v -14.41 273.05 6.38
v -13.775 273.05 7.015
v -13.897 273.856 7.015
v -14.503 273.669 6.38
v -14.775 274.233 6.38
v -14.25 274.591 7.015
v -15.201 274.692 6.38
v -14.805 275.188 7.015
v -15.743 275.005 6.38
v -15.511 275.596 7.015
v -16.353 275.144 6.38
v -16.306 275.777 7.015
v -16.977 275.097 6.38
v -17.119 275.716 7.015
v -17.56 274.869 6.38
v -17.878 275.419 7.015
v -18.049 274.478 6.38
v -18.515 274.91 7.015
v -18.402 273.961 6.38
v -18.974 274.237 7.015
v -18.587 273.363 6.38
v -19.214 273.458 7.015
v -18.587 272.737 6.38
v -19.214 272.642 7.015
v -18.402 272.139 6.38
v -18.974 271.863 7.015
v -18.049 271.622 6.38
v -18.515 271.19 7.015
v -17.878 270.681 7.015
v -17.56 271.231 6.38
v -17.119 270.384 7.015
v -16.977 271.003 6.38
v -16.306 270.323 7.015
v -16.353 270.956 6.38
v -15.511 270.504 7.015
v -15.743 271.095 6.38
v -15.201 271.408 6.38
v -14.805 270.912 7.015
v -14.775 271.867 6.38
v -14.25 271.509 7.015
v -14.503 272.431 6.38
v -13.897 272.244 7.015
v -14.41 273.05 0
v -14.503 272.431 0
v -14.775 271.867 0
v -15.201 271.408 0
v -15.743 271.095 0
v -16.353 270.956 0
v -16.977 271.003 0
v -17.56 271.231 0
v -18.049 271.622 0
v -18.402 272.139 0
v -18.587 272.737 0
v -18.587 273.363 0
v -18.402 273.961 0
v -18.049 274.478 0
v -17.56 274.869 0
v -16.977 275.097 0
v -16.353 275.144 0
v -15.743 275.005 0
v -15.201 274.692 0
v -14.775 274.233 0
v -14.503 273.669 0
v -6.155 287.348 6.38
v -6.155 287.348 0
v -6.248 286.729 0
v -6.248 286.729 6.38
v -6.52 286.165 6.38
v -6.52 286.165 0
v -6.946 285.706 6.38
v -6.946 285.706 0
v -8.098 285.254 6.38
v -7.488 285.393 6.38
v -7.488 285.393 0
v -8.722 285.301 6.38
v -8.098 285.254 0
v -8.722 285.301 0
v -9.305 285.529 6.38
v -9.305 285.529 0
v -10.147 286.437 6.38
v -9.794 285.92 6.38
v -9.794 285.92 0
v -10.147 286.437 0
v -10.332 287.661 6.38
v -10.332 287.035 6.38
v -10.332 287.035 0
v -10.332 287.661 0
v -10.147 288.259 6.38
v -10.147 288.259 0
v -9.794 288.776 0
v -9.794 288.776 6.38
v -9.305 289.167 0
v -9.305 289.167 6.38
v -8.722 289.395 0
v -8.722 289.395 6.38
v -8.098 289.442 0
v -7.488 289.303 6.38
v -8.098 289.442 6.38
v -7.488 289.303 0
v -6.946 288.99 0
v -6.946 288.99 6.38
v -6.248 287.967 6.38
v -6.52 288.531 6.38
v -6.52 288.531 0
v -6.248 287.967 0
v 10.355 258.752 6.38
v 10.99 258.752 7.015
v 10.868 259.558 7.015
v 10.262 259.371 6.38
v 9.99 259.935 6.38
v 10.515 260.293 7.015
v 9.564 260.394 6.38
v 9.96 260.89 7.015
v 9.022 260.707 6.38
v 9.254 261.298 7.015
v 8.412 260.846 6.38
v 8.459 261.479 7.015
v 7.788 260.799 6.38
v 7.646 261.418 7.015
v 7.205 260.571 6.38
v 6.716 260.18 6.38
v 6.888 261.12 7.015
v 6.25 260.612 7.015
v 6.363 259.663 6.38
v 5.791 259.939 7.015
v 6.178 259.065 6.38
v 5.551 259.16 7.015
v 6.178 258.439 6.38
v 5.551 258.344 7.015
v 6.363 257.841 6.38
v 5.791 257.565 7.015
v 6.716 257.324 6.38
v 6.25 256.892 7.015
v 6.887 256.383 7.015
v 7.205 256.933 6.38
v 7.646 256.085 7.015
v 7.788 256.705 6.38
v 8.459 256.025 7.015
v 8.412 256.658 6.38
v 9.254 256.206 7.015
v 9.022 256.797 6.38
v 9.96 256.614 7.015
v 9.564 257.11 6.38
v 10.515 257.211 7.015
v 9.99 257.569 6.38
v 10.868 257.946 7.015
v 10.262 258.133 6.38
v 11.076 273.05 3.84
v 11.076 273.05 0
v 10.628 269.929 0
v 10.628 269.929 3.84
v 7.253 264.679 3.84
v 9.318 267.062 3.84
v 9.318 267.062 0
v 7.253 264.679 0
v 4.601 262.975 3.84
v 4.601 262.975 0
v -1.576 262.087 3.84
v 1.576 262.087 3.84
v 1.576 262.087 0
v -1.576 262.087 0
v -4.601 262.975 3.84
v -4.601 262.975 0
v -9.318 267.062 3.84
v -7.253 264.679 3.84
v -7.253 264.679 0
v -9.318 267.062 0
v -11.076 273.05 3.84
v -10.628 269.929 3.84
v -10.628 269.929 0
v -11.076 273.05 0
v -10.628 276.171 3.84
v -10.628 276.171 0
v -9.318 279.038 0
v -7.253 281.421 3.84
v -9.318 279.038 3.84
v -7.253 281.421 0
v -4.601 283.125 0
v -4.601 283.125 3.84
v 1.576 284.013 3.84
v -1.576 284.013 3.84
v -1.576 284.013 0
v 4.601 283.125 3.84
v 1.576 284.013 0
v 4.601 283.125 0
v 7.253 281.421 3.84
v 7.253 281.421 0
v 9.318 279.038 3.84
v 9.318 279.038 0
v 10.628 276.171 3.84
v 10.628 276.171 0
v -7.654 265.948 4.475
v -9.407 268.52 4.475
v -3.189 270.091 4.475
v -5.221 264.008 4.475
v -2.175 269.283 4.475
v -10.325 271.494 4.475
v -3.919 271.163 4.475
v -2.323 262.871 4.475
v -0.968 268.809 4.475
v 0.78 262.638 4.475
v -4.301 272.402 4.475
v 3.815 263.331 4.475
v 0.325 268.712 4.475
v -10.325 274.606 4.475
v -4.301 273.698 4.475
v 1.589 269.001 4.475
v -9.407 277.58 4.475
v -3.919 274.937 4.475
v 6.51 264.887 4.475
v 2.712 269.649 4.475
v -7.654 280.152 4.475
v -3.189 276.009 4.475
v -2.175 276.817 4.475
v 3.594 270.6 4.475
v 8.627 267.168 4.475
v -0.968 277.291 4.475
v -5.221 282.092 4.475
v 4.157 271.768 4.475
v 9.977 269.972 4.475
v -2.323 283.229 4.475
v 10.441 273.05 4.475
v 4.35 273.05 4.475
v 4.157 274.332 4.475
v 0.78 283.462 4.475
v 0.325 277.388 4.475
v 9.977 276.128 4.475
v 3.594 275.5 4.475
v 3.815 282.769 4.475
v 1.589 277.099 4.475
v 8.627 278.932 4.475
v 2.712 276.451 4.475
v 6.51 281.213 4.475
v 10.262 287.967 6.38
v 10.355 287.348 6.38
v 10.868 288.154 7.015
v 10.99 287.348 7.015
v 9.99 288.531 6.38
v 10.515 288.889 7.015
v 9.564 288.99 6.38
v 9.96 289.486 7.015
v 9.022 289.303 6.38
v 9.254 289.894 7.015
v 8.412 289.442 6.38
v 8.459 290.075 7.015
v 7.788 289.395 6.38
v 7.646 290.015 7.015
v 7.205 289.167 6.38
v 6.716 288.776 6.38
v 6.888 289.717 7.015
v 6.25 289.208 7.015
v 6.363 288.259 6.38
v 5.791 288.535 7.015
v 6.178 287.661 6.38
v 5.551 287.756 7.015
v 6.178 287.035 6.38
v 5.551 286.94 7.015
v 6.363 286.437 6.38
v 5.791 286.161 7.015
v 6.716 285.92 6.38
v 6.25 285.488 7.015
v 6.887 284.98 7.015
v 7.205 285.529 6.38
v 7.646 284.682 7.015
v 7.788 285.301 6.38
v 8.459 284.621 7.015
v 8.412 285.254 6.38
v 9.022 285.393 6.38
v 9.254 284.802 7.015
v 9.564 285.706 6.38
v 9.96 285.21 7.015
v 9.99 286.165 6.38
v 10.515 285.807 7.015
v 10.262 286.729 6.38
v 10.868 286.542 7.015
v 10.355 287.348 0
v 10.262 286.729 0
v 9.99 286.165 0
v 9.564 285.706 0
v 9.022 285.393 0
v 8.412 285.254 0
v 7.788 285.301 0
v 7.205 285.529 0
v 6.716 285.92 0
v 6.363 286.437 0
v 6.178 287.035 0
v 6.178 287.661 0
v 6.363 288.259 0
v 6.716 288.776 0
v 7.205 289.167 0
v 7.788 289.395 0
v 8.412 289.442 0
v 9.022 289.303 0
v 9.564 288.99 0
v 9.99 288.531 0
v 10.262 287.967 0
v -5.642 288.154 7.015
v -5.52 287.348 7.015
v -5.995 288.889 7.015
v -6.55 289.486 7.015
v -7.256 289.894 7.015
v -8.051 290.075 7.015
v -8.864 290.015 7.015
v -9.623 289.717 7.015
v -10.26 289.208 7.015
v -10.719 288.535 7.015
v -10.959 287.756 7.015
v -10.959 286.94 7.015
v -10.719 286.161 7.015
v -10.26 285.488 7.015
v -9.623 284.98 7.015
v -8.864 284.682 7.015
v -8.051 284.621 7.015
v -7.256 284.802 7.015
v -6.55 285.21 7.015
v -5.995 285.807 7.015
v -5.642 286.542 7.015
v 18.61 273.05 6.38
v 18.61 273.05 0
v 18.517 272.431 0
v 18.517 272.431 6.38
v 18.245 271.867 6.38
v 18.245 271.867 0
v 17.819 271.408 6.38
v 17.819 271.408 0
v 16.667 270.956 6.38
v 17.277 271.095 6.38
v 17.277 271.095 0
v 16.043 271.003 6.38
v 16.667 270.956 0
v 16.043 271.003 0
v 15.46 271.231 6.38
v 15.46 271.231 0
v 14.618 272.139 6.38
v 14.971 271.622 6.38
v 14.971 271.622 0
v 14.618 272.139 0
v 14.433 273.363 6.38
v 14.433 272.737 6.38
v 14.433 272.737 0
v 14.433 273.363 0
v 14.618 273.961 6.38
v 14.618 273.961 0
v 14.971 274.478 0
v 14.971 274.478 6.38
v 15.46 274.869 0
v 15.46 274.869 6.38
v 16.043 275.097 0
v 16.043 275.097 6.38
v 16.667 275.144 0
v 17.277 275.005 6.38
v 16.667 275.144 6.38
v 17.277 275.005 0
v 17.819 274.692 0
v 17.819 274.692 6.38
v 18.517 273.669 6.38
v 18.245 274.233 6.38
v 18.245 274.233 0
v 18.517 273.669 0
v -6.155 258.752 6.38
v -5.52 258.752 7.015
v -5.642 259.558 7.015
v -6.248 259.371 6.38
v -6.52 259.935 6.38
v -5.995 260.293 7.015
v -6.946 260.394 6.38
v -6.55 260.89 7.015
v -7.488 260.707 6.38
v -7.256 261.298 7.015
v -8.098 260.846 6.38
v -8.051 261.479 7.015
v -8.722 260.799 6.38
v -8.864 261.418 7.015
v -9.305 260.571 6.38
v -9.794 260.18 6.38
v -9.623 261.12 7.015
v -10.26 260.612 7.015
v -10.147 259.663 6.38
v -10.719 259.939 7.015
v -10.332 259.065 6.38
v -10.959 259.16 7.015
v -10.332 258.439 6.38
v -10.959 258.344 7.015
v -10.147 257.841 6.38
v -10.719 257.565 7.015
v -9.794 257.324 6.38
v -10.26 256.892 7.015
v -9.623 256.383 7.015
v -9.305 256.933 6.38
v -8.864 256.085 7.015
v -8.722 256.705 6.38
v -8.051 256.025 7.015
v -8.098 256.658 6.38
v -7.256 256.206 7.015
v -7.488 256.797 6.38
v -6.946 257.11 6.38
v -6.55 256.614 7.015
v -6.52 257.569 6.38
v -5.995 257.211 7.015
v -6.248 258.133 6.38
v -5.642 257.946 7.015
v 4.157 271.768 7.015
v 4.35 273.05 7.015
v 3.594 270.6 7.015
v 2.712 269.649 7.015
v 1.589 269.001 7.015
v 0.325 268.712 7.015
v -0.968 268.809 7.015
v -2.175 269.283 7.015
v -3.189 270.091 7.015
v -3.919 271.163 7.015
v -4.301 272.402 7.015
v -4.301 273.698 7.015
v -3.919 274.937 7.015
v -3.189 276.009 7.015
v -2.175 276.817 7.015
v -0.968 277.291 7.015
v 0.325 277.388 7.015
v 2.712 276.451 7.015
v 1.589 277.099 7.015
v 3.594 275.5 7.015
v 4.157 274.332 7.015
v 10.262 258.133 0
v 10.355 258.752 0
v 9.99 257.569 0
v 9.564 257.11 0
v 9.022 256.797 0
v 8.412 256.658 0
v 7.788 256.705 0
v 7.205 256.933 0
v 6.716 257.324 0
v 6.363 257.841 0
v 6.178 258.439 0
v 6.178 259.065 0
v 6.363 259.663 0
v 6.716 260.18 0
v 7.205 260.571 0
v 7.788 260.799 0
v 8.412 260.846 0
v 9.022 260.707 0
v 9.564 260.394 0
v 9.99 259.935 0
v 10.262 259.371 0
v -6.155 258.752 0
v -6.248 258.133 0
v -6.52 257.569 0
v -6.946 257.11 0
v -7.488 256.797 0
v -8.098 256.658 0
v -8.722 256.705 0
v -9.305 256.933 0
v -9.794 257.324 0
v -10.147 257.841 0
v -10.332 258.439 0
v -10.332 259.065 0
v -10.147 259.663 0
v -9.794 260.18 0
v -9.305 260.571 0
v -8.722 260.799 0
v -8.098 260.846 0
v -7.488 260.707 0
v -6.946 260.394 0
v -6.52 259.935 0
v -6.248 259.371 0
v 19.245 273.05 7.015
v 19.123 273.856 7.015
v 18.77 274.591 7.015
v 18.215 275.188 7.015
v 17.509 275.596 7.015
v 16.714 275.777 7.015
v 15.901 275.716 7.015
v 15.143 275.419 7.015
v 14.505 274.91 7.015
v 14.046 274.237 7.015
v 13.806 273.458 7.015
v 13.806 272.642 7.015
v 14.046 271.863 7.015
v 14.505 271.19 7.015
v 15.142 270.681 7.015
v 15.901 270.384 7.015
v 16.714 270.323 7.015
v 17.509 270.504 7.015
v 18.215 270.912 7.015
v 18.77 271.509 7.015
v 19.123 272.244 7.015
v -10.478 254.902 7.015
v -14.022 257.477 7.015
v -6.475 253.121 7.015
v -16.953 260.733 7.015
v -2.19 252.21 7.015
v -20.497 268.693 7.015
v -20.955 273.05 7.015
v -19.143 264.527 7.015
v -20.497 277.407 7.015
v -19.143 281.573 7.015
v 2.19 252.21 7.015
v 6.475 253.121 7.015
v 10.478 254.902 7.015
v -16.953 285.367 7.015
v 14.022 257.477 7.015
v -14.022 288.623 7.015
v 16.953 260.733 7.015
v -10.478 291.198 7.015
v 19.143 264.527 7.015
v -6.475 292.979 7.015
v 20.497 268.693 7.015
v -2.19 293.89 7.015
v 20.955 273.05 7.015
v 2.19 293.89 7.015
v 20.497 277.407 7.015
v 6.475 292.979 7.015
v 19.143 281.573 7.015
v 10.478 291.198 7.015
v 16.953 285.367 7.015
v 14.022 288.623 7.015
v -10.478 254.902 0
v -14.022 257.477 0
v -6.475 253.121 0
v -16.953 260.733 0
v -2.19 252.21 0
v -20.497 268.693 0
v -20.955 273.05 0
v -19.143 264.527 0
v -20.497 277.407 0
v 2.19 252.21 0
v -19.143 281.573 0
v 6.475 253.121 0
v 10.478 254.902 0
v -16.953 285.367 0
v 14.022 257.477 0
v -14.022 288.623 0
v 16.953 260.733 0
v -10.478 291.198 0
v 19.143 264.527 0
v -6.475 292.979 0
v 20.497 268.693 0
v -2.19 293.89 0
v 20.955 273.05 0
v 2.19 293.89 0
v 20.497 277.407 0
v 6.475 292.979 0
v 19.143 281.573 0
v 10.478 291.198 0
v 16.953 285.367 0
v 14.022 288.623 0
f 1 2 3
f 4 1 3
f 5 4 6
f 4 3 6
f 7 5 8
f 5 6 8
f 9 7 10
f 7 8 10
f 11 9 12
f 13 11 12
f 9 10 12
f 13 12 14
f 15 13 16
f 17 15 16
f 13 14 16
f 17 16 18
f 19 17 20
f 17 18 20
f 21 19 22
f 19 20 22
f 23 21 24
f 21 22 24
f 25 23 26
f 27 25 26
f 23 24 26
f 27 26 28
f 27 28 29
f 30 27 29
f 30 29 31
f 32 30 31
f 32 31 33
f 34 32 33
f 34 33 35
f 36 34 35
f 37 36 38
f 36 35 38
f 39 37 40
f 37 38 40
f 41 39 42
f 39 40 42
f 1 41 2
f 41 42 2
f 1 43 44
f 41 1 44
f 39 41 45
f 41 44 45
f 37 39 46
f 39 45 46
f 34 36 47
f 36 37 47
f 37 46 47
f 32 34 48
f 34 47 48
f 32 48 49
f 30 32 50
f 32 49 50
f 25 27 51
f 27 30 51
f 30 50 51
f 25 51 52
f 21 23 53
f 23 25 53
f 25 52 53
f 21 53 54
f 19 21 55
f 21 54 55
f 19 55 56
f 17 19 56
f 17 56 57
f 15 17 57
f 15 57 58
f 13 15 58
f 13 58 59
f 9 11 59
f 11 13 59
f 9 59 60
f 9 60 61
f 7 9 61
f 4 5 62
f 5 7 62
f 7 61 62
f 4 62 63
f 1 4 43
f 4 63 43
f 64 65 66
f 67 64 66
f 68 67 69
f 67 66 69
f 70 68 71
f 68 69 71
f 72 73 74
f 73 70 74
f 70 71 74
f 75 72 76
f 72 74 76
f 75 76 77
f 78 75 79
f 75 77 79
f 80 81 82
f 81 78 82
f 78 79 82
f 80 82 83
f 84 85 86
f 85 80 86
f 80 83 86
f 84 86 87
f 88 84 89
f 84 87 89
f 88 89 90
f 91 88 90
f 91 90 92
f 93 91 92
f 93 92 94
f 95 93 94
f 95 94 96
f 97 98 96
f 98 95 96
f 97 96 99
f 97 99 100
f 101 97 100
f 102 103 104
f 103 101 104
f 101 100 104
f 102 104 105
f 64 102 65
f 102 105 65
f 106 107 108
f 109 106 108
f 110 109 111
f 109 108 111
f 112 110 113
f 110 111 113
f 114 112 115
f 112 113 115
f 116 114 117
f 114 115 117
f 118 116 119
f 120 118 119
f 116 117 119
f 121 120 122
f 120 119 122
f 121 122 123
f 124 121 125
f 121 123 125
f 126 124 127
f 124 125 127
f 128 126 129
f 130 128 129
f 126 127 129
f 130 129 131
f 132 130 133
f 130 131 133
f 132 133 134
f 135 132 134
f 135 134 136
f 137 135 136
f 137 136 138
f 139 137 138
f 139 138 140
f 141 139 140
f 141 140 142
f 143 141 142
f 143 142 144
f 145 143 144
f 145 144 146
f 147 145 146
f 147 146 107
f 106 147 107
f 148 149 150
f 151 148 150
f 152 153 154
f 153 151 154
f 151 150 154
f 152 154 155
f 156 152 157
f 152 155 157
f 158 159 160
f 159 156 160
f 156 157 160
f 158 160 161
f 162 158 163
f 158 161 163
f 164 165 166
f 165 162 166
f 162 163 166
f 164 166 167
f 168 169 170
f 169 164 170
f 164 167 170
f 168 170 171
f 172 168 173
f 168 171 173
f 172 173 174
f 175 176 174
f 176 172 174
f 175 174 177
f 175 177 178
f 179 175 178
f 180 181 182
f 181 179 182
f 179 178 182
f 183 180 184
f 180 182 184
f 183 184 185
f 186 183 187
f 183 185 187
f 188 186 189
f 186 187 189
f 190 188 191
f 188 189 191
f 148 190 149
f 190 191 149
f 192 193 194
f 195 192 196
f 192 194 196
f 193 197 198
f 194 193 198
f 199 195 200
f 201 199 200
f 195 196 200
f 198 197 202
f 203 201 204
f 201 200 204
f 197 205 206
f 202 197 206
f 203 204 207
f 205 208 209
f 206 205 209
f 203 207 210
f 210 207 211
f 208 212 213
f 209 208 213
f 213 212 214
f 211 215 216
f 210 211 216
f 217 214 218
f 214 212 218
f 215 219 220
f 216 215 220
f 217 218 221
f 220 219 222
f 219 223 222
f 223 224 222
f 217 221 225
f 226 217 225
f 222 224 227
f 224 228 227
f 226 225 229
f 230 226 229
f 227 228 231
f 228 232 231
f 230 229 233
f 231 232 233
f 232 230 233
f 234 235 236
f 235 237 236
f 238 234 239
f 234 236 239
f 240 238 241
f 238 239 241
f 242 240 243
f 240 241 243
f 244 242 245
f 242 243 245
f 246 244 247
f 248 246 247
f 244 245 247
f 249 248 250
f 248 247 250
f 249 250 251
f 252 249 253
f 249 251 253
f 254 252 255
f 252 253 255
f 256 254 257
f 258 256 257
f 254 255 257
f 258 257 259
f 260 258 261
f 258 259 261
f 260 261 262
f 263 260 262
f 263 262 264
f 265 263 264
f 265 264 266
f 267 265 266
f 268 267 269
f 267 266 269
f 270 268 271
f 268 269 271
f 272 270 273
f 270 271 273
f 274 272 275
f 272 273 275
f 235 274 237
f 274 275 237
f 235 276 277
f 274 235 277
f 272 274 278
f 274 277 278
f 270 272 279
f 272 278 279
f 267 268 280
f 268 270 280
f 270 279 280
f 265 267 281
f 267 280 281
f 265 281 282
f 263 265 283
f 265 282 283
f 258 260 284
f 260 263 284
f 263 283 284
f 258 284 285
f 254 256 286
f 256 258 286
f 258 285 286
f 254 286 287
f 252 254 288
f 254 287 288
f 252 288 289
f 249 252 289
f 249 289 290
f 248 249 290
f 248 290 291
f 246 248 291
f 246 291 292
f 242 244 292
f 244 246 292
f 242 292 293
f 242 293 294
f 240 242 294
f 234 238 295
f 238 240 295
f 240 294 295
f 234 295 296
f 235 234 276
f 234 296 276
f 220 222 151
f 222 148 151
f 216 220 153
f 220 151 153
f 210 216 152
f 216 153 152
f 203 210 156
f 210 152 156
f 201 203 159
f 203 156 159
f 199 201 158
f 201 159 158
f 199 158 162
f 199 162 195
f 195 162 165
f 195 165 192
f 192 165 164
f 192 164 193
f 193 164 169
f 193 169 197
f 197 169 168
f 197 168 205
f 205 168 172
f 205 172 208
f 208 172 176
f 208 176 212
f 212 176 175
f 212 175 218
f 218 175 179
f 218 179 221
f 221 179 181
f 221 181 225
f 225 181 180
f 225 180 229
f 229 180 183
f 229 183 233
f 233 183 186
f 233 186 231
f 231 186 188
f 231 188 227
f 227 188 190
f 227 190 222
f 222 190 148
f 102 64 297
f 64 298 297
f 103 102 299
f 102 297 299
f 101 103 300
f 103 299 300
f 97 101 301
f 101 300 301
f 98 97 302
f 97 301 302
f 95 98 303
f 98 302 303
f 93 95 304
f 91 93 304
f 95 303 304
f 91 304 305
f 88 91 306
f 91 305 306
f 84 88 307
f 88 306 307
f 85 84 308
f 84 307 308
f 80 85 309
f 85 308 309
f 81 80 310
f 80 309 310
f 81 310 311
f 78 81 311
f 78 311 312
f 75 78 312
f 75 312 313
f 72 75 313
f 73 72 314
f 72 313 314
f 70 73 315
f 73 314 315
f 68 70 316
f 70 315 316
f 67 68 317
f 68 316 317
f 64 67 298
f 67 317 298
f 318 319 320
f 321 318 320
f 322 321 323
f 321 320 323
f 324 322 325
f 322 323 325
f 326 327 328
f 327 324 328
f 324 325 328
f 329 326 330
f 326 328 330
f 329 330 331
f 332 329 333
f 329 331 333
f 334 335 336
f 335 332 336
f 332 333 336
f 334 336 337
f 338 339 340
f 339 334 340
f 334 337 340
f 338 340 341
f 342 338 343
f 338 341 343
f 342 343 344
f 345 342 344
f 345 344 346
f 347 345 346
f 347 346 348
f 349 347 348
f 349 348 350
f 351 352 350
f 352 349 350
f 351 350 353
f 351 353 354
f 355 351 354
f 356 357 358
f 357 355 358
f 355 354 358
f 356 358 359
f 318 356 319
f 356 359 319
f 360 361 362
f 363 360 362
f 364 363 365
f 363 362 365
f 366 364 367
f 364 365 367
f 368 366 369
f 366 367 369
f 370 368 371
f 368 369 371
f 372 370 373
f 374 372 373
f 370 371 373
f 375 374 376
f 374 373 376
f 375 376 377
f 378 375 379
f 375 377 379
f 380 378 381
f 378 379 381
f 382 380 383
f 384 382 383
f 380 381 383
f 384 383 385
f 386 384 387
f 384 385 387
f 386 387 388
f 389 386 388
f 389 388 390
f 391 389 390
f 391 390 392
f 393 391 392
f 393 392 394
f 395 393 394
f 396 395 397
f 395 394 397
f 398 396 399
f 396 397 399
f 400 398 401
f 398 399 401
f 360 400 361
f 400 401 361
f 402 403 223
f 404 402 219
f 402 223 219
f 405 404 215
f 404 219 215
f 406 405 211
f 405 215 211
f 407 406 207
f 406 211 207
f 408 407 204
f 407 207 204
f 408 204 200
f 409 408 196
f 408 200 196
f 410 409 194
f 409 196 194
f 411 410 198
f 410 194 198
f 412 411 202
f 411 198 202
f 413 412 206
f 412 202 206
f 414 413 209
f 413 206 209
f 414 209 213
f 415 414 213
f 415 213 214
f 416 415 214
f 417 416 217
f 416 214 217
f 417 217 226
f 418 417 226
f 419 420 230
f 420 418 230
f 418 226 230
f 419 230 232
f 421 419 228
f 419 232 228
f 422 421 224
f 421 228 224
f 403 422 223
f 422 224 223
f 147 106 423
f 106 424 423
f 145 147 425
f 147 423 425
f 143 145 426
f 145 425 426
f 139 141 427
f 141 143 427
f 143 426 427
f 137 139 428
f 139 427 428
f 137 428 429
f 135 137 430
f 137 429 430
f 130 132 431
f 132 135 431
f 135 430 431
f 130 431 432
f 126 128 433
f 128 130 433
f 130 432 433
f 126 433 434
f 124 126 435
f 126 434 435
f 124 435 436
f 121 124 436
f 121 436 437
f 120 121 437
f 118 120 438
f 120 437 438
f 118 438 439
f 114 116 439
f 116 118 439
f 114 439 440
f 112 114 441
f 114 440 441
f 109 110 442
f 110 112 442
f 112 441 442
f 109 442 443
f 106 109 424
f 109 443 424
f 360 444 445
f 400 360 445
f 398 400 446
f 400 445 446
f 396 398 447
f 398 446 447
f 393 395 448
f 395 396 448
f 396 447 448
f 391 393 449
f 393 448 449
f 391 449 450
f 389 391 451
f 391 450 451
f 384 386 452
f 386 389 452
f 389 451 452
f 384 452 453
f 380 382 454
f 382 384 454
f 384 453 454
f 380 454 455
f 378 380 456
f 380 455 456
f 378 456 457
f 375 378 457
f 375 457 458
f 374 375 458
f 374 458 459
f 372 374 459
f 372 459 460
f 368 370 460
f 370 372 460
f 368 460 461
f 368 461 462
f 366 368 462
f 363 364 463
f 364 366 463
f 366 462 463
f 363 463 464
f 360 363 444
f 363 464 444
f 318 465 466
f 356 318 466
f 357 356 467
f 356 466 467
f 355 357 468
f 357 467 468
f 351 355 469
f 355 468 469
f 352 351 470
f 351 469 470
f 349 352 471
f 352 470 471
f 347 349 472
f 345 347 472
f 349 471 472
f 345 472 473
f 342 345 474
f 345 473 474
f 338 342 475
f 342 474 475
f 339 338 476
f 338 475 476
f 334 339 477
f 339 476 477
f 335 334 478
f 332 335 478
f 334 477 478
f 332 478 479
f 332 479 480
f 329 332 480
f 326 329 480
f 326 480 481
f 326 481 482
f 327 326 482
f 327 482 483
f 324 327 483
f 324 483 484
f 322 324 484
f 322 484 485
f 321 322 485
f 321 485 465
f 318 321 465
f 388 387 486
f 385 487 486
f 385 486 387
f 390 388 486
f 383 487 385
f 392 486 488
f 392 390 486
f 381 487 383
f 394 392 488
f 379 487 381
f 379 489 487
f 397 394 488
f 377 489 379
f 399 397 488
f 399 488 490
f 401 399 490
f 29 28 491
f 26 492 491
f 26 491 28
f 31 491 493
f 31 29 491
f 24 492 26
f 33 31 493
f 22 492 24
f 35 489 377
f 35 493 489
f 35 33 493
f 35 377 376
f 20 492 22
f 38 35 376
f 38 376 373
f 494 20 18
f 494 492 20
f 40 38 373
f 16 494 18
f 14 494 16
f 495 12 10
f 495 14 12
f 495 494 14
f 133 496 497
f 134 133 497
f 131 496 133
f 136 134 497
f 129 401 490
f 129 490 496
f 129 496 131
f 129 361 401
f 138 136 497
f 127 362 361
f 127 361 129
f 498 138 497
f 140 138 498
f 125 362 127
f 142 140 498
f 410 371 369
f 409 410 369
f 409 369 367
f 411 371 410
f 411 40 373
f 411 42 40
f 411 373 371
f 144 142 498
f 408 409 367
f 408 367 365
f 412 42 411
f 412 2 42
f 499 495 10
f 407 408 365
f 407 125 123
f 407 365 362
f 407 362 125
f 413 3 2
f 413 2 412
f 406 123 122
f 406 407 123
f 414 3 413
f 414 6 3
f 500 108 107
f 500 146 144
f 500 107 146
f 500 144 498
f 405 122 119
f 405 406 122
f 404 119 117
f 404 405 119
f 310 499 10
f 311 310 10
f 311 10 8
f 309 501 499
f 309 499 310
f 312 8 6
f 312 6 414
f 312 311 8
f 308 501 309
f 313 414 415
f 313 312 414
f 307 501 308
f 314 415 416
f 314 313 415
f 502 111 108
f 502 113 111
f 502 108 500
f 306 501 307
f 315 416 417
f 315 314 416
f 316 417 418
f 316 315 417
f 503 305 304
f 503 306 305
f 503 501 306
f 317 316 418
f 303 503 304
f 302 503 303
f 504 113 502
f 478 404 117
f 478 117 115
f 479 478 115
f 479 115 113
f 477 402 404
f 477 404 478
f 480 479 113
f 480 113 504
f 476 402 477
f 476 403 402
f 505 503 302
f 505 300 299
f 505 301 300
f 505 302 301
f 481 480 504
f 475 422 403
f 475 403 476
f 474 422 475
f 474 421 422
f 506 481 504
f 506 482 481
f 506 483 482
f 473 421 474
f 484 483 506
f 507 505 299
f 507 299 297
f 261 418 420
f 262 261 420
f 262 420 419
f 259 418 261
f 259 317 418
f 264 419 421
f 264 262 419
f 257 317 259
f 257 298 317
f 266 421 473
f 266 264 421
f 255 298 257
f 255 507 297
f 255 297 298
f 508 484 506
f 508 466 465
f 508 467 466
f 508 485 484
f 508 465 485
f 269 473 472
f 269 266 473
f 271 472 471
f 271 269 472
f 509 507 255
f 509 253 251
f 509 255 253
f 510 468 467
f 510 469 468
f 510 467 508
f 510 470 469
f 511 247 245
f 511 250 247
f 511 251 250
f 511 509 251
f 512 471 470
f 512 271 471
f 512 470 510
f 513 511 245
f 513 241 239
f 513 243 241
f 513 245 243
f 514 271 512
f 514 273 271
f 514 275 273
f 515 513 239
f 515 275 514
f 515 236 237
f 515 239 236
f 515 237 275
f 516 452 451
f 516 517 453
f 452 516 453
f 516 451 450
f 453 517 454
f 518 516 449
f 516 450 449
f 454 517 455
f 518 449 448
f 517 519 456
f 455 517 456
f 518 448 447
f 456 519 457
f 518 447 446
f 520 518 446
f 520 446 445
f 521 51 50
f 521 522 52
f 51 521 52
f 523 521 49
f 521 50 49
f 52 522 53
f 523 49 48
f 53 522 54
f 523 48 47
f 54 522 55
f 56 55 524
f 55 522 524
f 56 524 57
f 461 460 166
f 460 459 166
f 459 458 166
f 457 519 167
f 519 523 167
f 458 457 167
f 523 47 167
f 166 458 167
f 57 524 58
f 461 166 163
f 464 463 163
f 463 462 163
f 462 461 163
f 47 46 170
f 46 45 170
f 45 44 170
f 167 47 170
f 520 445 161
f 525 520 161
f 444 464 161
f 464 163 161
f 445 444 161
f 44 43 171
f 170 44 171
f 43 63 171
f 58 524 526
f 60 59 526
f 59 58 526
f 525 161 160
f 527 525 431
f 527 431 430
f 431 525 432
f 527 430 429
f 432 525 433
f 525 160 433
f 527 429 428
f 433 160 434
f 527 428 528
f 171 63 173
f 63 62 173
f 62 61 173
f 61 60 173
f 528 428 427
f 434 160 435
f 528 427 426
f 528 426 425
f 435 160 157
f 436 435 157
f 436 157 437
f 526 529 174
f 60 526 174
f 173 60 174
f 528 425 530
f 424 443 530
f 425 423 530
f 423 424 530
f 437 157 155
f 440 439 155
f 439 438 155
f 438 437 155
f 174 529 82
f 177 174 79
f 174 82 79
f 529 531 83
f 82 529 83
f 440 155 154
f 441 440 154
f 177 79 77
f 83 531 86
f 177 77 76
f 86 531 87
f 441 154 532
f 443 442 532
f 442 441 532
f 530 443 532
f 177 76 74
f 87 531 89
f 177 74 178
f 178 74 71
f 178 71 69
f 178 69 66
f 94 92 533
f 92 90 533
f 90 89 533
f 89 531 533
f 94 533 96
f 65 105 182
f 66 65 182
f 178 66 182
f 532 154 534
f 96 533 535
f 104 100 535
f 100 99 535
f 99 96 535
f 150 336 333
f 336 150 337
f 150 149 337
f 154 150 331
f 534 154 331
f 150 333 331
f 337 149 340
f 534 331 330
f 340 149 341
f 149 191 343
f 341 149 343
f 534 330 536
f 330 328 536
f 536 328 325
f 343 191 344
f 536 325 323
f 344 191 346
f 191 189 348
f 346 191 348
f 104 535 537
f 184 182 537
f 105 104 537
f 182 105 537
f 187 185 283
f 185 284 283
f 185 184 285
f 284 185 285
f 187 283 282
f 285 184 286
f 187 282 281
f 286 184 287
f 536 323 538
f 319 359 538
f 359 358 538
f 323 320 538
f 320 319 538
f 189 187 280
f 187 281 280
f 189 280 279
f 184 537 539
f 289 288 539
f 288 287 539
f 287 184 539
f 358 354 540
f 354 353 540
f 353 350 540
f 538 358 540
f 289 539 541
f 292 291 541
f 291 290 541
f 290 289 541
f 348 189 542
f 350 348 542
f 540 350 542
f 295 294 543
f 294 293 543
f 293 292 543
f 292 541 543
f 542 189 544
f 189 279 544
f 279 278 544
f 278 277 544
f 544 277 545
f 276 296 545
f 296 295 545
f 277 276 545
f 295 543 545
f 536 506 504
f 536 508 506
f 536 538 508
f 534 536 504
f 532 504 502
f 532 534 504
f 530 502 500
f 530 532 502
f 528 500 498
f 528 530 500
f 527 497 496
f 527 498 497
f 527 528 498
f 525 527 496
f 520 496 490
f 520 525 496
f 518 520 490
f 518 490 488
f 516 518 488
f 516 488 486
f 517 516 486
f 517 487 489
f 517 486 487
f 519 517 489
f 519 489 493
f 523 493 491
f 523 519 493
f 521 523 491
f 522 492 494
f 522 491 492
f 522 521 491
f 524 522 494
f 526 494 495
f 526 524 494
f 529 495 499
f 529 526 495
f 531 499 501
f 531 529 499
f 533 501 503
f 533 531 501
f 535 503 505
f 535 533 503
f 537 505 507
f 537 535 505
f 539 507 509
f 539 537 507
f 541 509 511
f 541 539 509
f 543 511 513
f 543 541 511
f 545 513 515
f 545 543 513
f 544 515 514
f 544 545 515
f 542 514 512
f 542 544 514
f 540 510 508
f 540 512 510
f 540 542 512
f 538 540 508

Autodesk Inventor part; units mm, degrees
ref_plane "YZ Plane" through (0, 0, 0) normal (1, 0, 0) x (0, 1, 0)
ref_plane "XZ Plane" through (0, 0, 0) normal (0, 1, 0) x (-1, 0, 0)
ref_plane "XY Plane" through (0, 0, 0) normal (0, 0, 1) x (1, 0, 0)
sketch "Sketch1" plane through (0, 0, 0) normal (0, 0, 1) x (1, 0, 0)
  circle A0 centre (0, 273.05) radius 20.955 projected
  circle A1 centre (0, 273.05) radius 11 projected
  arc A2 (219.754, -304.8) -> (225.7704, -296.4188) centre (219.754, -298.45) ccw projected
  line L0 (225.7704, -296.4188) -> (30.0819, 283.206) projected
  arc A3 (30.0819, 283.206) -> (-30.0819, 283.206) centre (0, 273.05) ccw projected
  line L1 (-30.0819, 283.206) -> (-225.7704, -296.4188) projected
  arc A4 (-225.7704, -296.4188) -> (-219.754, -304.8) centre (-219.754, -298.45) ccw projected
  line L2 (-219.754, -304.8) -> (219.754, -304.8) projected
  line L3 (-38.1, -17.4222) -> (-38.1, -222.25) projected
  arc A5 (-44.45, -228.6) -> (-38.1, -222.25) centre (-44.45, -222.25) ccw projected
  line L4 (-44.45, -228.6) -> (-113.6024, -228.6) projected
  arc A6 (-119.6188, -220.2188) -> (-113.6024, -228.6) centre (-113.6024, -222.25) ccw projected
  line L5 (-119.6188, -220.2188) -> (-50.4664, -15.391) projected
  arc A7 (-38.1, -17.4222) -> (-50.4664, -15.391) centre (-44.45, -17.4222) ccw projected
  line L6 (113.6024, -228.6) -> (44.45, -228.6) projected
  arc A8 (38.1, -222.25) -> (44.45, -228.6) centre (44.45, -222.25) ccw projected
  line L7 (38.1, -222.25) -> (38.1, -17.4222) projected
  arc A9 (50.4664, -15.391) -> (38.1, -17.4222) centre (44.45, -17.4222) ccw projected
  line L8 (50.4664, -15.391) -> (119.6188, -220.2188) projected
  arc A10 (113.6024, -228.6) -> (119.6188, -220.2188) centre (113.6024, -222.25) ccw projected
  circle A11 centre (-204.2059, -292.1) radius 2 projected
  circle A12 centre (-187.0552, -241.3) radius 2 projected
  circle A13 centre (187.0552, -241.3) radius 2 projected
  circle A14 centre (204.2059, -292.1) radius 2 projected
  circle A15 centre (19.05, -241.3) radius 2 projected
  circle A16 centre (19.05, -292.1) radius 2 projected
  circle A17 centre (-19.05, -292.1) radius 2 projected
  circle A18 centre (-19.05, -241.3) radius 2 projected
  circle A19 centre (8.255, 287.3481) radius 2 projected
  circle A20 centre (-8.255, 287.3481) radius 2 projected
  circle A21 centre (-16.51, 273.05) radius 2 projected
  circle A22 centre (-8.255, 258.7519) radius 2 projected
  circle A23 centre (8.255, 258.7519) radius 2 projected
  circle A24 centre (16.51, 273.05) radius 2 projected
  circle A25 centre (0, 273.05) radius 11 projected
  circle A26 centre (0, 273.05) radius 11.0762
  circle A27 centre (-8.255, 287.3481) radius 2.1
  circle A28 centre (8.255, 287.3481) radius 2.1
  circle A29 centre (16.51, 273.05) radius 2.1
  circle A30 centre (8.255, 258.7519) radius 2.1
  circle A31 centre (-8.255, 258.7519) radius 2.1
  circle A32 centre (-16.51, 273.05) radius 2.1
  circle A33 centre (0, 273.05) radius 4.35
  point P0 (0, 0)
  dimension "d0" = 0.0762
  dimension "d1" = 4.2
  dimension "d2" = 4.2
  dimension "d3" = 4.2
  dimension "d4" = 4.2
  dimension "d5" = 4.2
  dimension "d6" = 4.2
  dimension "d9" = 8.7
extrude "Extrusion1" add sketch "Sketch1" along normal blind 7.015 contours A0 | A1 | A26
extrude "Extrusion2" cut sketch "Sketch1" along normal blind 4.475 contours A1 | A26 | A33
chamfer "Chamfer1" distance 0.635 angle 45 7 edges at (-11.0762, 273.05, 4.475) (6.155, 287.3481, 7.015) (-10.355, 287.3481, 7.015) (-18.61, 273.05, 7.015) (-10.355, 258.7519, 7.015) (6.155, 258.7519, 7.015) (14.41, 273.05, 7.015)
properties part number "MainOuterBearingMount"
